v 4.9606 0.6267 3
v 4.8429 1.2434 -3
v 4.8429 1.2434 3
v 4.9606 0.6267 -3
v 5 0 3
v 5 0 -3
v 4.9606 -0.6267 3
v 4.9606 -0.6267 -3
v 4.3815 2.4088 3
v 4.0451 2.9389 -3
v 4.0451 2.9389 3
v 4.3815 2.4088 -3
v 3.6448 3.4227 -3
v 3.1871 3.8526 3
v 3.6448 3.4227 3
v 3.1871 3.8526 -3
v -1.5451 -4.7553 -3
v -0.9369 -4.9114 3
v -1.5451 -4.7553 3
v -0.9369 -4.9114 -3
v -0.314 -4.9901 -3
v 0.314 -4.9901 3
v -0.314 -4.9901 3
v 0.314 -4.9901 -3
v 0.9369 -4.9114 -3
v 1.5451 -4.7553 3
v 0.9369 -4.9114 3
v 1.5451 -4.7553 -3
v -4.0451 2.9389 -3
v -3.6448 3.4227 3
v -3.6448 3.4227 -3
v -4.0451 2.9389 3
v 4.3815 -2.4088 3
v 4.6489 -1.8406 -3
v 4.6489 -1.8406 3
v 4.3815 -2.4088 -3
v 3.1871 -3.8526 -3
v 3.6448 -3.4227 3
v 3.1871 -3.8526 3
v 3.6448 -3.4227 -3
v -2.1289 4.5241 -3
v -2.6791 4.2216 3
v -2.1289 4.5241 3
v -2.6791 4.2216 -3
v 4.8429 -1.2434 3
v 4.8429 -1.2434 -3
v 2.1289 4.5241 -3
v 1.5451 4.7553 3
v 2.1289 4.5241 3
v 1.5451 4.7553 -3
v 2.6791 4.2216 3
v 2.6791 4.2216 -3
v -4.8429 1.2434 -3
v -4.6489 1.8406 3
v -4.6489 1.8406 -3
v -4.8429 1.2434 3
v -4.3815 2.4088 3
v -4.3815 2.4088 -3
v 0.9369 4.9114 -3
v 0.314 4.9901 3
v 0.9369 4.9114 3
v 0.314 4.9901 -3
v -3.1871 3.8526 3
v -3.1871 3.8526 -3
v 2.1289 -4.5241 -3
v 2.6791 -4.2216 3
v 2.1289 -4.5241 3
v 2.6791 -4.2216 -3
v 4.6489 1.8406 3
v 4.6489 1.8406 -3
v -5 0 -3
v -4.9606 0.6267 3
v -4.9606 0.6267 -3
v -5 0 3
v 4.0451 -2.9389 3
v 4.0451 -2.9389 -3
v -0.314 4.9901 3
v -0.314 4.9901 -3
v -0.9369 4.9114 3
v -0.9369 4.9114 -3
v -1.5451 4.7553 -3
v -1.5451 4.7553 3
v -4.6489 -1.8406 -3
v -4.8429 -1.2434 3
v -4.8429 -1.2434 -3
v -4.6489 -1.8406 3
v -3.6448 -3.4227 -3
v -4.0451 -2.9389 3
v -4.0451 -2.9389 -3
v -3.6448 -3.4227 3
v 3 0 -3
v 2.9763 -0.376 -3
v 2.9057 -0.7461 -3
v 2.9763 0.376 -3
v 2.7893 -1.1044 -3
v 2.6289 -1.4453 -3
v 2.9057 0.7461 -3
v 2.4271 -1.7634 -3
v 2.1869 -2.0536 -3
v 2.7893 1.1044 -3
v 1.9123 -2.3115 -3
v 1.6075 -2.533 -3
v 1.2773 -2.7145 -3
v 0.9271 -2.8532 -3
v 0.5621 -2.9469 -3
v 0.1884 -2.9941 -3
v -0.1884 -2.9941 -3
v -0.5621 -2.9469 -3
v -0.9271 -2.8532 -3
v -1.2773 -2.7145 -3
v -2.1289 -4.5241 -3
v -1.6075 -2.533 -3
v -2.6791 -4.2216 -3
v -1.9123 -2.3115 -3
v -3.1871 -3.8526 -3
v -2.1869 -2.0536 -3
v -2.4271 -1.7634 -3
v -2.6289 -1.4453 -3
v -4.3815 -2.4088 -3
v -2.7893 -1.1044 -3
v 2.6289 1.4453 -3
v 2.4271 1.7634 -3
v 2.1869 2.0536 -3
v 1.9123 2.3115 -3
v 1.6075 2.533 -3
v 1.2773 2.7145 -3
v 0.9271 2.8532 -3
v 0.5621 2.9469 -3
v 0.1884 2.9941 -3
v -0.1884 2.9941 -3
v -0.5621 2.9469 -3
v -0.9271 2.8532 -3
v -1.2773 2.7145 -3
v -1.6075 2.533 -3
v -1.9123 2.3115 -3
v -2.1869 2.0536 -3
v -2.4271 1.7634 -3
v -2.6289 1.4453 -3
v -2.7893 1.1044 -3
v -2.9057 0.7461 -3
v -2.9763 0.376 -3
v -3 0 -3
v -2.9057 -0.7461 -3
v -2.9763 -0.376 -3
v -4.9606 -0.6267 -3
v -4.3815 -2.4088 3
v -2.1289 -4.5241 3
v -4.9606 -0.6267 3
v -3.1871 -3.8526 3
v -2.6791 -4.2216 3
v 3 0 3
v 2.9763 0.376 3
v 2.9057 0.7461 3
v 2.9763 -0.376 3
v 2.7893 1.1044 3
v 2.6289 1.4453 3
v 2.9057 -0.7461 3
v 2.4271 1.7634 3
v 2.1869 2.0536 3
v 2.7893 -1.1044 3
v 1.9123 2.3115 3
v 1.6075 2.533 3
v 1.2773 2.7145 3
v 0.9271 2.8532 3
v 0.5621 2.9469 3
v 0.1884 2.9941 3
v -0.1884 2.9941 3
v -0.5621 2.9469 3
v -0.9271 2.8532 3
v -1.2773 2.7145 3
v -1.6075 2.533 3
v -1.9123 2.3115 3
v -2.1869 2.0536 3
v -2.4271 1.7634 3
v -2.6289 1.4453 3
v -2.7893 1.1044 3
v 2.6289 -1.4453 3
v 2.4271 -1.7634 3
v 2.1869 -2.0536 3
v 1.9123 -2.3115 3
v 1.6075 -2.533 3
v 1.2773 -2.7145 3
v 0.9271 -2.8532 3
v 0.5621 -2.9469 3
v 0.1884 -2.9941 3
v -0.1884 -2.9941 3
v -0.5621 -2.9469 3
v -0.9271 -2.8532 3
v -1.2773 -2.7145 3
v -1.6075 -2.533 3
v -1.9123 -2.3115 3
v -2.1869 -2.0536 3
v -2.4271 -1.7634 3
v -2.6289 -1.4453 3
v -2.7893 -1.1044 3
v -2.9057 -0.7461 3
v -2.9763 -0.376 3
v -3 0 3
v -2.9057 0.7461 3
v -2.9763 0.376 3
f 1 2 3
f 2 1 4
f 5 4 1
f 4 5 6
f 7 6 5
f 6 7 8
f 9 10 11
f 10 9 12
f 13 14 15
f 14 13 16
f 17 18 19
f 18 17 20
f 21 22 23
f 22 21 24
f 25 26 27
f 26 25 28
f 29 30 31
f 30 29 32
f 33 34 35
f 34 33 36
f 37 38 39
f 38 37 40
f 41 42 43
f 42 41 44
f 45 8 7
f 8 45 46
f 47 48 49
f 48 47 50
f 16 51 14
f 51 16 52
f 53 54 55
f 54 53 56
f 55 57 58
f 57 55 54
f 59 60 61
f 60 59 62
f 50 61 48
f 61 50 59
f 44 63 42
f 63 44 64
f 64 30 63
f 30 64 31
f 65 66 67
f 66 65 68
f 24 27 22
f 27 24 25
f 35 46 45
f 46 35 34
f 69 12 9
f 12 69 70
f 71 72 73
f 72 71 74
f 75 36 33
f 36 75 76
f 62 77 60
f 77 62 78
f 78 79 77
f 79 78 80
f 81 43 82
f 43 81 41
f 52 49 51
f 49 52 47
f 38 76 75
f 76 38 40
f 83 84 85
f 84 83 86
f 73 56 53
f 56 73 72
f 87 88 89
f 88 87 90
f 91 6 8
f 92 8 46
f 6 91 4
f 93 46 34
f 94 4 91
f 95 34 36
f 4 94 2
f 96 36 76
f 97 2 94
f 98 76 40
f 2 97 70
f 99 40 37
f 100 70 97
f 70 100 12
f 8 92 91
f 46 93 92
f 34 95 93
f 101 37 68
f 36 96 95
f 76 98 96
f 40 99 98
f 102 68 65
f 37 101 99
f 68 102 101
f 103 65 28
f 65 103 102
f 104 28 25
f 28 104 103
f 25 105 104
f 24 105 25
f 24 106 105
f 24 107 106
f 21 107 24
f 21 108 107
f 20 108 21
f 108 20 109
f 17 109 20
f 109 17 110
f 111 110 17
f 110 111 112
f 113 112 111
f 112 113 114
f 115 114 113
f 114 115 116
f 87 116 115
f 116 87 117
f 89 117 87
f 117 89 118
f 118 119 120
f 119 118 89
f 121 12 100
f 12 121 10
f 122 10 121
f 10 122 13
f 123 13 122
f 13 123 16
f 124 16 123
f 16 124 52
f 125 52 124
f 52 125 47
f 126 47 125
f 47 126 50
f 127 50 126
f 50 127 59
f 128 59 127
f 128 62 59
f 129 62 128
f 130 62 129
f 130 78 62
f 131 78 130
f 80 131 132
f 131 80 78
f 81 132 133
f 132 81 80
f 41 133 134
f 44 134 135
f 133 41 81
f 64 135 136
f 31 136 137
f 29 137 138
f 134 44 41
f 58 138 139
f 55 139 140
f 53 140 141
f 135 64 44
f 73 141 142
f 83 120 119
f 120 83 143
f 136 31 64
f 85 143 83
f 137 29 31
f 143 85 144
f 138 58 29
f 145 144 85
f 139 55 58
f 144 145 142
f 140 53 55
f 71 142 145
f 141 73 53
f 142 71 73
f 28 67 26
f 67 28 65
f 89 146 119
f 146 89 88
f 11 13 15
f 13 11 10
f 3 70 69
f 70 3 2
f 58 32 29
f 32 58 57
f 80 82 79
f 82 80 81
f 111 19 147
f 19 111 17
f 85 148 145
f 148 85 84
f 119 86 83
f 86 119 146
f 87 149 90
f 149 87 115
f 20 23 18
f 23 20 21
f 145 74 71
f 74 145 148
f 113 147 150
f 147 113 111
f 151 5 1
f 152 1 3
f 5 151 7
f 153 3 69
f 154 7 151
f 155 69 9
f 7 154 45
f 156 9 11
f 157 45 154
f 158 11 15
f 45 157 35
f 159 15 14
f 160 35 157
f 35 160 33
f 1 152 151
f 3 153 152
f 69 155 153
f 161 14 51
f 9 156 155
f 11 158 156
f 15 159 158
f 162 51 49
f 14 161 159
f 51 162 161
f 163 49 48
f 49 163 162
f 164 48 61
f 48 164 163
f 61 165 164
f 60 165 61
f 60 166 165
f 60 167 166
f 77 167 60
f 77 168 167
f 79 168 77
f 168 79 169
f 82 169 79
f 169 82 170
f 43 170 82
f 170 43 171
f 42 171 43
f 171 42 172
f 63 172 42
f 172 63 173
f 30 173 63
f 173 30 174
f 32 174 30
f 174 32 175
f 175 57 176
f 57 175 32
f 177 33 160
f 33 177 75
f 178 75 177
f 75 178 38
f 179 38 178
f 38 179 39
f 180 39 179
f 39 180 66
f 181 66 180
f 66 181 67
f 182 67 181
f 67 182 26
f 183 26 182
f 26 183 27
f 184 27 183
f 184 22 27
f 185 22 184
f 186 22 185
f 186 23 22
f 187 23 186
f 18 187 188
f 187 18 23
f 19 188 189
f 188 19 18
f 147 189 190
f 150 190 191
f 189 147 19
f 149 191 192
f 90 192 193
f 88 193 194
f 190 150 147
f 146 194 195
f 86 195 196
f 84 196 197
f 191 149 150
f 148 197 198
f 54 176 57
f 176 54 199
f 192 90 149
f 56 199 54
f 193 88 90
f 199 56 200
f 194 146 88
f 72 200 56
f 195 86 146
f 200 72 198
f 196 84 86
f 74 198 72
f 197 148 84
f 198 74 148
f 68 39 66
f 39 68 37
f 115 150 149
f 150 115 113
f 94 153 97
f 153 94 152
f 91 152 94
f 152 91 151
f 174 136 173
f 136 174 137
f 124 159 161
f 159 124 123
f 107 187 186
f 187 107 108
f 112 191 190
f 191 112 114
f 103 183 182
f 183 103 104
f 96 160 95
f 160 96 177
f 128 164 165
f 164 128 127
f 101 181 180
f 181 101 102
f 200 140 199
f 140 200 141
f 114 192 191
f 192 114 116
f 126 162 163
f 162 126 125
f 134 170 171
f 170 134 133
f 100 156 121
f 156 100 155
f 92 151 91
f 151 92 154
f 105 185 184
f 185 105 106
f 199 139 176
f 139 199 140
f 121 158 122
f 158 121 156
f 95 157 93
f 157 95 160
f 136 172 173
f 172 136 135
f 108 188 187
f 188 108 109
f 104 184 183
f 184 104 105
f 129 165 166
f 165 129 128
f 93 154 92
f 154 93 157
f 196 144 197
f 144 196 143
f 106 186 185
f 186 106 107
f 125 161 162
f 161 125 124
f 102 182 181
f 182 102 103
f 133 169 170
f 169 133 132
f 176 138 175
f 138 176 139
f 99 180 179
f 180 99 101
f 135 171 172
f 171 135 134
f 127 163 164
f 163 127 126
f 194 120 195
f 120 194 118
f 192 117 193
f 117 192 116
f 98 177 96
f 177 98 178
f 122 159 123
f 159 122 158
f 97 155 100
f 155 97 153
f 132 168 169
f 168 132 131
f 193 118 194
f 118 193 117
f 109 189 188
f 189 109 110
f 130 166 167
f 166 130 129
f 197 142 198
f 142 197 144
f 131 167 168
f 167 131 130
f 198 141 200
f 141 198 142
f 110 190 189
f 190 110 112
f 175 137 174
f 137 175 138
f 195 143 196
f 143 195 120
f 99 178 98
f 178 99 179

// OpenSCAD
$fn = 50;


difference() {
	union() {
		translate(v = [0, 0, -3.0000000000]) {
			cylinder(h = 6, r = 5.0000000000);
		}
	}
	union() {
		translate(v = [0, 0, -100.0000000000]) {
			cylinder(h = 200, r = 3.0000000000);
		}
	}
}
